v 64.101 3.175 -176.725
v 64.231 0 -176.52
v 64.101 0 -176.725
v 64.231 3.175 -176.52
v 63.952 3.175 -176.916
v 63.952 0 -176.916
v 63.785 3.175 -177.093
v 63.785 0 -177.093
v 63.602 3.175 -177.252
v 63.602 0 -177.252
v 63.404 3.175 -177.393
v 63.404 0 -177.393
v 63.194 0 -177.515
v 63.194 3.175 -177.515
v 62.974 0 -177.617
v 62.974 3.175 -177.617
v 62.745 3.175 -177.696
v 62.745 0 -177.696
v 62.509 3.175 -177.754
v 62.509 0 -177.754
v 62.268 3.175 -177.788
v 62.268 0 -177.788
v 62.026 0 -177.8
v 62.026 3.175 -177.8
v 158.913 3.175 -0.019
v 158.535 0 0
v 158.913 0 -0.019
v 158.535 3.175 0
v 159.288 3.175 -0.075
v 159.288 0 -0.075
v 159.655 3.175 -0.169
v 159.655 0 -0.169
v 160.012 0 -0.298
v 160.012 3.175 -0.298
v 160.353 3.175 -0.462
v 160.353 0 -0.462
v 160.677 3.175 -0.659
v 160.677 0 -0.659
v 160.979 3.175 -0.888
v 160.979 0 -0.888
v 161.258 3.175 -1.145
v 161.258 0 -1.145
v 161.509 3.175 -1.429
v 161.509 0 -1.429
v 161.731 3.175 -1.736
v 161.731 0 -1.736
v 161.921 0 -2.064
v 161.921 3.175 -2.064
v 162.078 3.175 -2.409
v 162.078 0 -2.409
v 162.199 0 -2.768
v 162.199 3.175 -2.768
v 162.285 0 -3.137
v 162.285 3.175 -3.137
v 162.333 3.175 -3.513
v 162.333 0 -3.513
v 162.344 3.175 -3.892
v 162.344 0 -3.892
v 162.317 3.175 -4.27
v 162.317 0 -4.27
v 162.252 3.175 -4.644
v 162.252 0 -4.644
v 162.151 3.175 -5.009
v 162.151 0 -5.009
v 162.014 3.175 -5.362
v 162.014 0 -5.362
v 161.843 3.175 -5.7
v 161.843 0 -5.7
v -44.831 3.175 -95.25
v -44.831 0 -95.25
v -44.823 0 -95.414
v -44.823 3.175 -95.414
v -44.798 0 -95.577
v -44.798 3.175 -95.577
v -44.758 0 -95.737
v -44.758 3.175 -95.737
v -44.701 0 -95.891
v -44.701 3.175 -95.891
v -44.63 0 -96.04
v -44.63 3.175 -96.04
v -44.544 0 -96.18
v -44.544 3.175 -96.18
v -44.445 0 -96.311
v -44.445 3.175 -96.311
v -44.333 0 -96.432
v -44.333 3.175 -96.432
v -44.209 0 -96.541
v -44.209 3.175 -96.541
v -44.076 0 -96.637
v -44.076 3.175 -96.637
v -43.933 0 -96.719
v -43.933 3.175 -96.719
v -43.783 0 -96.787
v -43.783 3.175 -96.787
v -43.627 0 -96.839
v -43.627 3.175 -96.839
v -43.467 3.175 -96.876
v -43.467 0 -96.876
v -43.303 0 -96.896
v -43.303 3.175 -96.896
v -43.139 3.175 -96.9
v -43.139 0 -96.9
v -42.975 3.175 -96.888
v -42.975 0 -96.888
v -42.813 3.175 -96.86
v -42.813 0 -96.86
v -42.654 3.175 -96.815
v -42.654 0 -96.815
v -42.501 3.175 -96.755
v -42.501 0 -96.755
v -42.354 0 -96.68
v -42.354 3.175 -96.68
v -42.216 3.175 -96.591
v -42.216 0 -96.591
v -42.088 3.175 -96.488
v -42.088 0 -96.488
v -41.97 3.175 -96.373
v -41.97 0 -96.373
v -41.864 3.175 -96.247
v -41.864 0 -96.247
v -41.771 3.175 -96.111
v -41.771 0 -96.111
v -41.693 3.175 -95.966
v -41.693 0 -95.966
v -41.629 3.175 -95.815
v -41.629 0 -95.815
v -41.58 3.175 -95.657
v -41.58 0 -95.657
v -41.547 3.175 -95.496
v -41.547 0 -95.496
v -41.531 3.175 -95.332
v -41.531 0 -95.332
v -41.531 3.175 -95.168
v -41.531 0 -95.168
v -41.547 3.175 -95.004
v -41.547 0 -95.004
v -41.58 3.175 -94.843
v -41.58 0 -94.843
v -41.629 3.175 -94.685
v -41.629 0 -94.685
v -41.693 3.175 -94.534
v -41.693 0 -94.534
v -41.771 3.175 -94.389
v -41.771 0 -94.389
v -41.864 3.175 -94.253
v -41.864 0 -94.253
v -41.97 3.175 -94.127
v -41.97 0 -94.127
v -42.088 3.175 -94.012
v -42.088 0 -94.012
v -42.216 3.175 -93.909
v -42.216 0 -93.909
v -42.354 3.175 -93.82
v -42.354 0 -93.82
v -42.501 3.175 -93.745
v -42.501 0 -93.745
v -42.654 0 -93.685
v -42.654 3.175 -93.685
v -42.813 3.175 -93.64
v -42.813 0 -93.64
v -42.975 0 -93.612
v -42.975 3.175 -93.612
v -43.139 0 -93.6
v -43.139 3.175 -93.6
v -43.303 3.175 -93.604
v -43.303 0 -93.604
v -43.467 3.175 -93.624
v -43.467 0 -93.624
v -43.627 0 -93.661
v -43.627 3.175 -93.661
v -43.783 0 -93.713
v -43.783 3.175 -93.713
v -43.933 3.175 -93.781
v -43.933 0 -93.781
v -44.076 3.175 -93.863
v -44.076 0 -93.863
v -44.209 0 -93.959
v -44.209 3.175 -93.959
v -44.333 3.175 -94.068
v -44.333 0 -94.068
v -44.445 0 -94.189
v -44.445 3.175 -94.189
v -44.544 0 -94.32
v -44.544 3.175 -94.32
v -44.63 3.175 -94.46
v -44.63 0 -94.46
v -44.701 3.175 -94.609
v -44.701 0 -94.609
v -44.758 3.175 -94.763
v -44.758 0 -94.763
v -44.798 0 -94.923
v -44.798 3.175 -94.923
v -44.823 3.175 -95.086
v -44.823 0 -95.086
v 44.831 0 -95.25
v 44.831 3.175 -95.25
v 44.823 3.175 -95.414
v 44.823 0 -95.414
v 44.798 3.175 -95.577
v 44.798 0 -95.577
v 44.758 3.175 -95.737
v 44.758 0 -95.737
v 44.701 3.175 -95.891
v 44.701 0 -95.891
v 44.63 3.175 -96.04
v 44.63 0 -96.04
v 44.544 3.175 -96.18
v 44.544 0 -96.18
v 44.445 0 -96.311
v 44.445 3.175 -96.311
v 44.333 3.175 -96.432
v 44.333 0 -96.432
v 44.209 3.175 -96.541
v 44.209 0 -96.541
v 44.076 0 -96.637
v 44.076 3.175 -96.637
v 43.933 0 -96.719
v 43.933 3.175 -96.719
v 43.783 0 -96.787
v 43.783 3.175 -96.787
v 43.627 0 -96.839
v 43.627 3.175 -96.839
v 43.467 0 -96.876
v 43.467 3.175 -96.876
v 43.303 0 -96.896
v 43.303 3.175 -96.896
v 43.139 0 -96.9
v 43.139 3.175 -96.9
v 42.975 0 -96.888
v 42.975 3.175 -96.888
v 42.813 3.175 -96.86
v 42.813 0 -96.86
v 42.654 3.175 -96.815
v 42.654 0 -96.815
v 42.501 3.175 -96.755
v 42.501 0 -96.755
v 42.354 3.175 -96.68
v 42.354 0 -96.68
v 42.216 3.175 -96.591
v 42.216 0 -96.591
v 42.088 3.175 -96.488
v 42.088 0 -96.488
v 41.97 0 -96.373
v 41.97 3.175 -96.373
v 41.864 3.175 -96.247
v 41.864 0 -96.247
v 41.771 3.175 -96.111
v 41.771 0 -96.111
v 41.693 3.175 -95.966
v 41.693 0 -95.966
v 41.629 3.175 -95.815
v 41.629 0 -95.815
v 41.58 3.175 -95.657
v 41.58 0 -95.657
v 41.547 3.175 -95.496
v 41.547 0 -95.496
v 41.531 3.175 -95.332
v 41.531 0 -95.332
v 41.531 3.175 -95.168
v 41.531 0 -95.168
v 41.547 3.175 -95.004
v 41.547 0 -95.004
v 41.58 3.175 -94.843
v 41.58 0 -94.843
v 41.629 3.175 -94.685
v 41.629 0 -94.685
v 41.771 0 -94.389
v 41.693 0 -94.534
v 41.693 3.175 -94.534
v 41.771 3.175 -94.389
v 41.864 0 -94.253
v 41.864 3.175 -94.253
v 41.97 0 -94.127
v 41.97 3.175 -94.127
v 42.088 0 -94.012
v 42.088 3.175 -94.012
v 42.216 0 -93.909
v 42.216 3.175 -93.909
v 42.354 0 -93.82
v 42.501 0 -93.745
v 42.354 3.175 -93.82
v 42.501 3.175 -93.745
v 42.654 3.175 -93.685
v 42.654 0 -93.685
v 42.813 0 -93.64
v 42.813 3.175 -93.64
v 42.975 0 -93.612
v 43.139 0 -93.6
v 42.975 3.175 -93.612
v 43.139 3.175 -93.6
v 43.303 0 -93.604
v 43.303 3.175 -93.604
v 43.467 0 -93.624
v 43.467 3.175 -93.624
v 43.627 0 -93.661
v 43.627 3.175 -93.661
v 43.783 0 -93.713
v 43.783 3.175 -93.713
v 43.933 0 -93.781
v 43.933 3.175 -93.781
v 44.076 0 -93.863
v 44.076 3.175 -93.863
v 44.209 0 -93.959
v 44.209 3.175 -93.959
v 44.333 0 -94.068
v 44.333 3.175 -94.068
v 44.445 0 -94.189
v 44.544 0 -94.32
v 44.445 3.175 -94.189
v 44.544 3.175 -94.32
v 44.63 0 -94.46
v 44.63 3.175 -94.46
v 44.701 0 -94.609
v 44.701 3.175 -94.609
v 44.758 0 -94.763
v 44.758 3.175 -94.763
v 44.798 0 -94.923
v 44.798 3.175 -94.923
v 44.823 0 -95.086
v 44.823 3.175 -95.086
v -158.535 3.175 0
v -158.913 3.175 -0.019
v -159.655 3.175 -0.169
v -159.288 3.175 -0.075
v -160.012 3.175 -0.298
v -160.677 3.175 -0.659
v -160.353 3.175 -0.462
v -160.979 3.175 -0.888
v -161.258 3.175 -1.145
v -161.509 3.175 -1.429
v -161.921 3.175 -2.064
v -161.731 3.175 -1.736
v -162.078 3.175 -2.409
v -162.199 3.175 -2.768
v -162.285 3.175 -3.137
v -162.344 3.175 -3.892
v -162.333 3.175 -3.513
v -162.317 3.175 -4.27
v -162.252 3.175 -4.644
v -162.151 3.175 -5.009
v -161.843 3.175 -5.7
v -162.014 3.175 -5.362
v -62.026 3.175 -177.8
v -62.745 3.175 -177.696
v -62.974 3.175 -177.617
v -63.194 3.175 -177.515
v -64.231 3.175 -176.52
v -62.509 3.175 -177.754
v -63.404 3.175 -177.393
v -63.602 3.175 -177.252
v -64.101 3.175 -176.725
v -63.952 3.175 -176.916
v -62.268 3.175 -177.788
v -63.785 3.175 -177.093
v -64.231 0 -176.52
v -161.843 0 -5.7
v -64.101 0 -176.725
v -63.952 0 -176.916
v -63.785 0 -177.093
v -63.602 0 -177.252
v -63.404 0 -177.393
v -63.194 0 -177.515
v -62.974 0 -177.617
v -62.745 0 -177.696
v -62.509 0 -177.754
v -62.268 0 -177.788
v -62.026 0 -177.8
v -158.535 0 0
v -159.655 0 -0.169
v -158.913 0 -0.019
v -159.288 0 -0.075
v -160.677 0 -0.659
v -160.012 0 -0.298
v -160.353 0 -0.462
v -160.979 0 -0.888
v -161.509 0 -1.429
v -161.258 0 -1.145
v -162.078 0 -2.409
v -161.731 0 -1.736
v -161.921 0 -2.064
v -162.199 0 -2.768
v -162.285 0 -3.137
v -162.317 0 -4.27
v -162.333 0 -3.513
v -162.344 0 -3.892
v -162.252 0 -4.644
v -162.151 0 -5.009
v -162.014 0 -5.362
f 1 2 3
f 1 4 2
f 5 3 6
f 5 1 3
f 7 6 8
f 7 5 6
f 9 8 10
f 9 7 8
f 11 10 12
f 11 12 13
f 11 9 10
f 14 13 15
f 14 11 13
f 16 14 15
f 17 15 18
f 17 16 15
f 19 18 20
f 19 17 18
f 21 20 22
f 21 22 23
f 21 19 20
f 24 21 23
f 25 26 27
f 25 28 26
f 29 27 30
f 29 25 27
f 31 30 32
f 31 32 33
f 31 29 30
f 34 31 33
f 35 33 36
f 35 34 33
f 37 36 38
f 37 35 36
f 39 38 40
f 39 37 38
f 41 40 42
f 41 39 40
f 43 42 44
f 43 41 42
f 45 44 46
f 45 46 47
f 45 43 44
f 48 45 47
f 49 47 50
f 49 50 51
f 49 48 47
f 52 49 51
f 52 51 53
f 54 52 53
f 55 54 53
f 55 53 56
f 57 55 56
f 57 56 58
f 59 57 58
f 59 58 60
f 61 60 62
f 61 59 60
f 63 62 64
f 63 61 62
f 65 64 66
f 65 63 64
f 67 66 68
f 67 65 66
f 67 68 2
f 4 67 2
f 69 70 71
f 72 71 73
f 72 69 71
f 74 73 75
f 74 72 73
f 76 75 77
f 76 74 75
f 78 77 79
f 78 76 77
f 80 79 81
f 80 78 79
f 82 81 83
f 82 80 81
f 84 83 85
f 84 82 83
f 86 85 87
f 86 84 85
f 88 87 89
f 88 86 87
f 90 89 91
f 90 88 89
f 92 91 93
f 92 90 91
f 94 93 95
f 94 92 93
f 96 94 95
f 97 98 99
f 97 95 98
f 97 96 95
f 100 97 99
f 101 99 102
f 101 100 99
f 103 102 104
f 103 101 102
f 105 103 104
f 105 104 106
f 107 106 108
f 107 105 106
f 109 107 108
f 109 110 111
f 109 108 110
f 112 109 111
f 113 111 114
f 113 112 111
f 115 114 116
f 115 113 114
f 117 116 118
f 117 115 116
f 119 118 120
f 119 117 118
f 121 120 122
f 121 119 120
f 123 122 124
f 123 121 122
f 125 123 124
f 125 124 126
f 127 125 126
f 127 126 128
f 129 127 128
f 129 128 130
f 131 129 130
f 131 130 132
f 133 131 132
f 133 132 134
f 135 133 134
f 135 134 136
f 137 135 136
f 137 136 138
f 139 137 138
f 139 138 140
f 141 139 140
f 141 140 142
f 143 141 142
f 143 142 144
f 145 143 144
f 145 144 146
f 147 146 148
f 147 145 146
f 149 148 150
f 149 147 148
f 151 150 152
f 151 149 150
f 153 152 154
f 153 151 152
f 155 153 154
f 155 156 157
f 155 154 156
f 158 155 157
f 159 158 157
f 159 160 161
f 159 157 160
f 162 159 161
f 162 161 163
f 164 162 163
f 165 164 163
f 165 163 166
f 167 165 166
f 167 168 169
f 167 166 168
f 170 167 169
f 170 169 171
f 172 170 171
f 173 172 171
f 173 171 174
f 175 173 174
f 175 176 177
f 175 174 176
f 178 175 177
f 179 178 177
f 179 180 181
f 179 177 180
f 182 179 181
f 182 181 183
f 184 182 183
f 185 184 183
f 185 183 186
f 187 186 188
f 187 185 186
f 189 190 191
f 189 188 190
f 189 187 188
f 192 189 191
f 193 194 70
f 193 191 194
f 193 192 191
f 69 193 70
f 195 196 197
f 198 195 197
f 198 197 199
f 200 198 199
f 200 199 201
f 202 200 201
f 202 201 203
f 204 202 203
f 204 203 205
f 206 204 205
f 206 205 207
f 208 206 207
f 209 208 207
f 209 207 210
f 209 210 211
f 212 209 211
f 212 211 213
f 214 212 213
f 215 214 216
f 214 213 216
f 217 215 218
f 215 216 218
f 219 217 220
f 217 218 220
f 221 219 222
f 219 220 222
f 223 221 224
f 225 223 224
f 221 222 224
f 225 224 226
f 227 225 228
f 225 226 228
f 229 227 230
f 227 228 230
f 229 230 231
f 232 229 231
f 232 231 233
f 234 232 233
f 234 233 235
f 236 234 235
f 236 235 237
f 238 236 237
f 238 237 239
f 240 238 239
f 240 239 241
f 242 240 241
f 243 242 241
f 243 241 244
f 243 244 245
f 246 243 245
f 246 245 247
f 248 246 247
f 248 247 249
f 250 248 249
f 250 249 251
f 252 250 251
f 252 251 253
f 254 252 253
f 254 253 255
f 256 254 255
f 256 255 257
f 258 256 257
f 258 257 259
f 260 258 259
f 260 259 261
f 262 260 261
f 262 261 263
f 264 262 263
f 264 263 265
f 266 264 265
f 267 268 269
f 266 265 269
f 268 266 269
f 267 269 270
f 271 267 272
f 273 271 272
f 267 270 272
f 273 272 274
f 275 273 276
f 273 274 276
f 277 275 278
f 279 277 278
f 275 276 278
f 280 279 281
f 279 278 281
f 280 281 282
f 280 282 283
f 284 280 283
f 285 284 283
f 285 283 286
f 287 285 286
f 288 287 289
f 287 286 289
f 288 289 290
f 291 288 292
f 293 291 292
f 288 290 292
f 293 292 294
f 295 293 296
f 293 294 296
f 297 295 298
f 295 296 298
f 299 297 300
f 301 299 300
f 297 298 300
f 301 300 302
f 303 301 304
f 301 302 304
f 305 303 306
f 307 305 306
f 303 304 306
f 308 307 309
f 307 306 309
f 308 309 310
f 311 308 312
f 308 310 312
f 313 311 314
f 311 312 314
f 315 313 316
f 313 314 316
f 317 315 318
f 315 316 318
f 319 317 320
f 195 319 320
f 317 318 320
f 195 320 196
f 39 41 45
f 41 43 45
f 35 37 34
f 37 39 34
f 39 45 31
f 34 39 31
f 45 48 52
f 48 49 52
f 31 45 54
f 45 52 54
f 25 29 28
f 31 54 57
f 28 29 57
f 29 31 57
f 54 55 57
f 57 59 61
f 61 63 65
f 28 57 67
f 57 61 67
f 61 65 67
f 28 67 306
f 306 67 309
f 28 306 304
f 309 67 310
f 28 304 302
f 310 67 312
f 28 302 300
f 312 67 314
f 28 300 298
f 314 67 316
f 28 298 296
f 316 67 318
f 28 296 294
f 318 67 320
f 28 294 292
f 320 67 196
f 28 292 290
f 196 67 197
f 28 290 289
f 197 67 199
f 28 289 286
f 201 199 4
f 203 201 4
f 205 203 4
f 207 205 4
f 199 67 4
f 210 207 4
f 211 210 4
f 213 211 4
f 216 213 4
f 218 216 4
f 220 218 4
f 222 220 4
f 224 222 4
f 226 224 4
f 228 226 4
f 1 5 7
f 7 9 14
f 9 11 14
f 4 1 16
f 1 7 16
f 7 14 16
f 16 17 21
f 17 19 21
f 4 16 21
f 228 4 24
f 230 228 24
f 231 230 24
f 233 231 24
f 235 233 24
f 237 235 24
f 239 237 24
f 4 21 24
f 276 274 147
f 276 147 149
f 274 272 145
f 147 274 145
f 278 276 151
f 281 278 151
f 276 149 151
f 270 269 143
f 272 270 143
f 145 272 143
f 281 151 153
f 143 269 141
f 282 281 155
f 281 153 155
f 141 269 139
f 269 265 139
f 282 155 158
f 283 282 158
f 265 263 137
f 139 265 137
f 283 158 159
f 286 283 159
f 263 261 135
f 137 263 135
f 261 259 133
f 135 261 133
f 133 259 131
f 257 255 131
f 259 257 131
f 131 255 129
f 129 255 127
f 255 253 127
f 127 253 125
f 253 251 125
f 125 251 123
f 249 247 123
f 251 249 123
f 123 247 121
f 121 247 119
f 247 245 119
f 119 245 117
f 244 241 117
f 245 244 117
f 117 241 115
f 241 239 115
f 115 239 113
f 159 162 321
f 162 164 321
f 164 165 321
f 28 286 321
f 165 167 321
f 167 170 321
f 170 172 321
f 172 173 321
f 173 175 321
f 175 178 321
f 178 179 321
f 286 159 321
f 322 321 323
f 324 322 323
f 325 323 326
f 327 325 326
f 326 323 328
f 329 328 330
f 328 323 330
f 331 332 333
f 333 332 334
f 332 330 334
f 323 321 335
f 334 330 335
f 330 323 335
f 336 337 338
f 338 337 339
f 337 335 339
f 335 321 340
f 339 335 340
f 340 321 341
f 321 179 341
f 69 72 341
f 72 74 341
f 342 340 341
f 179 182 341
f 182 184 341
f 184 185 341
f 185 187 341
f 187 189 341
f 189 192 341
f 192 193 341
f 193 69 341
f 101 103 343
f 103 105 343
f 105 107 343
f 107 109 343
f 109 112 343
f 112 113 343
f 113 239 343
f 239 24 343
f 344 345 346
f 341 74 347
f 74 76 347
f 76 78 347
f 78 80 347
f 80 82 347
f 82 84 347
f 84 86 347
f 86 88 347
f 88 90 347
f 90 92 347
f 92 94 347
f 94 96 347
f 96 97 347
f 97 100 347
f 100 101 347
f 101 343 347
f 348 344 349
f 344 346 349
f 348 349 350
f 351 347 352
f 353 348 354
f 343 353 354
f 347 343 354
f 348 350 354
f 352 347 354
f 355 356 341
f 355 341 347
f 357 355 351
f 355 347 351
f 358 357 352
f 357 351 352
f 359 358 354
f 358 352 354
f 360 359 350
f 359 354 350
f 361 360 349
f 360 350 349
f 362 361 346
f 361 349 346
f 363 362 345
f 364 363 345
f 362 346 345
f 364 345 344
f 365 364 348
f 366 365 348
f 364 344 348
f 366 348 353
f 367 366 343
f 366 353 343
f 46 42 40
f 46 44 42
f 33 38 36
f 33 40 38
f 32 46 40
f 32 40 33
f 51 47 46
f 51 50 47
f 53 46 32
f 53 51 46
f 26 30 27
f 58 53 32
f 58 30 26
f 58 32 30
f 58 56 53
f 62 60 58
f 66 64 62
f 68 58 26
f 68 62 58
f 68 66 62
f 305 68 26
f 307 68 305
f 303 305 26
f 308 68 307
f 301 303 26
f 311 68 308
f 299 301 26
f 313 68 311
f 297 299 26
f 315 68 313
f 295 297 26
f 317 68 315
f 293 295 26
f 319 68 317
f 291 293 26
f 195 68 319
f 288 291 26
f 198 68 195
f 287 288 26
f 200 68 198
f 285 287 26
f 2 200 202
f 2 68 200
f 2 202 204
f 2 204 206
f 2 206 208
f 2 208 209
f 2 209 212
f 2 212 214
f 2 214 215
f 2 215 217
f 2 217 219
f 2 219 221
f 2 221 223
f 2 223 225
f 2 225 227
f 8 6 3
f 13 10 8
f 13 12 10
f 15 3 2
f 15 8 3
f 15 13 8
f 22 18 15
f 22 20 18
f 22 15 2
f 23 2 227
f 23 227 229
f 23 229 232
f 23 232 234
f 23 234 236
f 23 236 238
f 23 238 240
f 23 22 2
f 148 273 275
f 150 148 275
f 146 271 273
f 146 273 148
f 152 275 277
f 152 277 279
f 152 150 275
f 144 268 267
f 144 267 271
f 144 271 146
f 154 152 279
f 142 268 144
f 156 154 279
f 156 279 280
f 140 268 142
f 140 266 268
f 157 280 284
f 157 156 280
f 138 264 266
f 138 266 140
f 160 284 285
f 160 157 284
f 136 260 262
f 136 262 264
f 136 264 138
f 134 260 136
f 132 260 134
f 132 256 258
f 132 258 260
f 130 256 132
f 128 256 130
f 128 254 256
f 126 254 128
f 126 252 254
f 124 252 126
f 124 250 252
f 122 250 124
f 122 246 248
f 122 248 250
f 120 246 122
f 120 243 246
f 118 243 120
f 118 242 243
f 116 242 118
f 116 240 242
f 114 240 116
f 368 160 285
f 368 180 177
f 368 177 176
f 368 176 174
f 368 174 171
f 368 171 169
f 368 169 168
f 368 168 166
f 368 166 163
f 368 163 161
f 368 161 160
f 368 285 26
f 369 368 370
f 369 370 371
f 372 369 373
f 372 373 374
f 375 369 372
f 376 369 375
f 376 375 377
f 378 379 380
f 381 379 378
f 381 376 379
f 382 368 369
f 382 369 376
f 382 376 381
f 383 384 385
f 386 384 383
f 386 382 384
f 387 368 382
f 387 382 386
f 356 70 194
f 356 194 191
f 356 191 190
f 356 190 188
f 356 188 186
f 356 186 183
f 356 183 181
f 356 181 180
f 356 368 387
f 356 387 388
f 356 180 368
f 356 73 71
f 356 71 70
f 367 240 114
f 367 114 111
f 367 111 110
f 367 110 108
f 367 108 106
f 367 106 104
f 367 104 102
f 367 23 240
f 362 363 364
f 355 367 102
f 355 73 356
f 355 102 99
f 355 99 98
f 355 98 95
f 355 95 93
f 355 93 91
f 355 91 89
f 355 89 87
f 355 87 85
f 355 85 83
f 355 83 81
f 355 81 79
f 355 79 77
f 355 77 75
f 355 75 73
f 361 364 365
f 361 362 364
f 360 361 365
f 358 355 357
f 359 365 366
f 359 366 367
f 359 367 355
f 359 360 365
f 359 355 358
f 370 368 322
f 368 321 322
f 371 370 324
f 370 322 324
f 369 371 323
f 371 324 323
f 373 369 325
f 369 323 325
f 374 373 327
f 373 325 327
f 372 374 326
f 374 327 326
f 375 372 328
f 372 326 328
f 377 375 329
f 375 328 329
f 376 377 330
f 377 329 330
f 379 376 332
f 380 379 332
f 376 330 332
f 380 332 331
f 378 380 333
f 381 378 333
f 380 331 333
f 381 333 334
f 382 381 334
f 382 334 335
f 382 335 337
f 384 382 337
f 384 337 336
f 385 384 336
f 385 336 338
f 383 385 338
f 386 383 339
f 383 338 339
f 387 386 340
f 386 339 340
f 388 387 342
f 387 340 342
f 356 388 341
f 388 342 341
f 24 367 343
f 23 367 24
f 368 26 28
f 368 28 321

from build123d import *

# Parameters (mm, degrees)
BOSS_EXTRUDE1_DEPTH = 3.175
FILLET1_R           = 3.81
FILLET2_R           = 2.54
SKETCH2_R           = 1.651
CUT_EXTRUDE1_DEPTH  = 4.175


with BuildPart() as part:
    # Sketch1 → Boss-Extrude1 (new body)
    with BuildSketch(Plane(origin=(0, 0, 0), x_dir=(1, 0, 0), z_dir=(0, 1, 0))):
        Polygon((0, 0), (165.1, 0), (63.5, 177.8), (0, 177.8), align=None)
    boss_extrude1 = extrude(amount=BOSS_EXTRUDE1_DEPTH)

    # Mirror1: Boss-Extrude1 across plane
    add(boss_extrude1.mirror(Plane(origin=(0, 0, 0), x_dir=(0, 0, 1), z_dir=(1, 0, 0))))

    # Fillet1
    fillet1_edges = [part.edges().sort_by_distance(p)[0] for p in [
        (-165.1, 1.5875, 0),
        (165.1, 1.5875, 0),
    ]]
    fillet(fillet1_edges, radius=FILLET1_R)

    # Fillet2
    fillet2_edges = [part.edges().sort_by_distance(p)[0] for p in [
        (-63.5, 1.5875, -177.8),
        (63.5, 1.5875, -177.8),
    ]]
    fillet(fillet2_edges, radius=FILLET2_R)

    # Sketch2 → Cut-Extrude1 (cut, through all)
    with BuildSketch(Plane(origin=(0, 3.175, 0), x_dir=(1, 0, 0), z_dir=(0, 1, 0))):
        with Locations((43.18, 95.25)):
            Circle(SKETCH2_R)
    cut_extrude1 = extrude(amount=-CUT_EXTRUDE1_DEPTH, mode=Mode.SUBTRACT)

    # Mirror2: Cut-Extrude1 across plane
    add(cut_extrude1.mirror(Plane(origin=(0, 0, 0), x_dir=(0, 0, 1), z_dir=(1, 0, 0))), mode=Mode.SUBTRACT)


solid = part.part
